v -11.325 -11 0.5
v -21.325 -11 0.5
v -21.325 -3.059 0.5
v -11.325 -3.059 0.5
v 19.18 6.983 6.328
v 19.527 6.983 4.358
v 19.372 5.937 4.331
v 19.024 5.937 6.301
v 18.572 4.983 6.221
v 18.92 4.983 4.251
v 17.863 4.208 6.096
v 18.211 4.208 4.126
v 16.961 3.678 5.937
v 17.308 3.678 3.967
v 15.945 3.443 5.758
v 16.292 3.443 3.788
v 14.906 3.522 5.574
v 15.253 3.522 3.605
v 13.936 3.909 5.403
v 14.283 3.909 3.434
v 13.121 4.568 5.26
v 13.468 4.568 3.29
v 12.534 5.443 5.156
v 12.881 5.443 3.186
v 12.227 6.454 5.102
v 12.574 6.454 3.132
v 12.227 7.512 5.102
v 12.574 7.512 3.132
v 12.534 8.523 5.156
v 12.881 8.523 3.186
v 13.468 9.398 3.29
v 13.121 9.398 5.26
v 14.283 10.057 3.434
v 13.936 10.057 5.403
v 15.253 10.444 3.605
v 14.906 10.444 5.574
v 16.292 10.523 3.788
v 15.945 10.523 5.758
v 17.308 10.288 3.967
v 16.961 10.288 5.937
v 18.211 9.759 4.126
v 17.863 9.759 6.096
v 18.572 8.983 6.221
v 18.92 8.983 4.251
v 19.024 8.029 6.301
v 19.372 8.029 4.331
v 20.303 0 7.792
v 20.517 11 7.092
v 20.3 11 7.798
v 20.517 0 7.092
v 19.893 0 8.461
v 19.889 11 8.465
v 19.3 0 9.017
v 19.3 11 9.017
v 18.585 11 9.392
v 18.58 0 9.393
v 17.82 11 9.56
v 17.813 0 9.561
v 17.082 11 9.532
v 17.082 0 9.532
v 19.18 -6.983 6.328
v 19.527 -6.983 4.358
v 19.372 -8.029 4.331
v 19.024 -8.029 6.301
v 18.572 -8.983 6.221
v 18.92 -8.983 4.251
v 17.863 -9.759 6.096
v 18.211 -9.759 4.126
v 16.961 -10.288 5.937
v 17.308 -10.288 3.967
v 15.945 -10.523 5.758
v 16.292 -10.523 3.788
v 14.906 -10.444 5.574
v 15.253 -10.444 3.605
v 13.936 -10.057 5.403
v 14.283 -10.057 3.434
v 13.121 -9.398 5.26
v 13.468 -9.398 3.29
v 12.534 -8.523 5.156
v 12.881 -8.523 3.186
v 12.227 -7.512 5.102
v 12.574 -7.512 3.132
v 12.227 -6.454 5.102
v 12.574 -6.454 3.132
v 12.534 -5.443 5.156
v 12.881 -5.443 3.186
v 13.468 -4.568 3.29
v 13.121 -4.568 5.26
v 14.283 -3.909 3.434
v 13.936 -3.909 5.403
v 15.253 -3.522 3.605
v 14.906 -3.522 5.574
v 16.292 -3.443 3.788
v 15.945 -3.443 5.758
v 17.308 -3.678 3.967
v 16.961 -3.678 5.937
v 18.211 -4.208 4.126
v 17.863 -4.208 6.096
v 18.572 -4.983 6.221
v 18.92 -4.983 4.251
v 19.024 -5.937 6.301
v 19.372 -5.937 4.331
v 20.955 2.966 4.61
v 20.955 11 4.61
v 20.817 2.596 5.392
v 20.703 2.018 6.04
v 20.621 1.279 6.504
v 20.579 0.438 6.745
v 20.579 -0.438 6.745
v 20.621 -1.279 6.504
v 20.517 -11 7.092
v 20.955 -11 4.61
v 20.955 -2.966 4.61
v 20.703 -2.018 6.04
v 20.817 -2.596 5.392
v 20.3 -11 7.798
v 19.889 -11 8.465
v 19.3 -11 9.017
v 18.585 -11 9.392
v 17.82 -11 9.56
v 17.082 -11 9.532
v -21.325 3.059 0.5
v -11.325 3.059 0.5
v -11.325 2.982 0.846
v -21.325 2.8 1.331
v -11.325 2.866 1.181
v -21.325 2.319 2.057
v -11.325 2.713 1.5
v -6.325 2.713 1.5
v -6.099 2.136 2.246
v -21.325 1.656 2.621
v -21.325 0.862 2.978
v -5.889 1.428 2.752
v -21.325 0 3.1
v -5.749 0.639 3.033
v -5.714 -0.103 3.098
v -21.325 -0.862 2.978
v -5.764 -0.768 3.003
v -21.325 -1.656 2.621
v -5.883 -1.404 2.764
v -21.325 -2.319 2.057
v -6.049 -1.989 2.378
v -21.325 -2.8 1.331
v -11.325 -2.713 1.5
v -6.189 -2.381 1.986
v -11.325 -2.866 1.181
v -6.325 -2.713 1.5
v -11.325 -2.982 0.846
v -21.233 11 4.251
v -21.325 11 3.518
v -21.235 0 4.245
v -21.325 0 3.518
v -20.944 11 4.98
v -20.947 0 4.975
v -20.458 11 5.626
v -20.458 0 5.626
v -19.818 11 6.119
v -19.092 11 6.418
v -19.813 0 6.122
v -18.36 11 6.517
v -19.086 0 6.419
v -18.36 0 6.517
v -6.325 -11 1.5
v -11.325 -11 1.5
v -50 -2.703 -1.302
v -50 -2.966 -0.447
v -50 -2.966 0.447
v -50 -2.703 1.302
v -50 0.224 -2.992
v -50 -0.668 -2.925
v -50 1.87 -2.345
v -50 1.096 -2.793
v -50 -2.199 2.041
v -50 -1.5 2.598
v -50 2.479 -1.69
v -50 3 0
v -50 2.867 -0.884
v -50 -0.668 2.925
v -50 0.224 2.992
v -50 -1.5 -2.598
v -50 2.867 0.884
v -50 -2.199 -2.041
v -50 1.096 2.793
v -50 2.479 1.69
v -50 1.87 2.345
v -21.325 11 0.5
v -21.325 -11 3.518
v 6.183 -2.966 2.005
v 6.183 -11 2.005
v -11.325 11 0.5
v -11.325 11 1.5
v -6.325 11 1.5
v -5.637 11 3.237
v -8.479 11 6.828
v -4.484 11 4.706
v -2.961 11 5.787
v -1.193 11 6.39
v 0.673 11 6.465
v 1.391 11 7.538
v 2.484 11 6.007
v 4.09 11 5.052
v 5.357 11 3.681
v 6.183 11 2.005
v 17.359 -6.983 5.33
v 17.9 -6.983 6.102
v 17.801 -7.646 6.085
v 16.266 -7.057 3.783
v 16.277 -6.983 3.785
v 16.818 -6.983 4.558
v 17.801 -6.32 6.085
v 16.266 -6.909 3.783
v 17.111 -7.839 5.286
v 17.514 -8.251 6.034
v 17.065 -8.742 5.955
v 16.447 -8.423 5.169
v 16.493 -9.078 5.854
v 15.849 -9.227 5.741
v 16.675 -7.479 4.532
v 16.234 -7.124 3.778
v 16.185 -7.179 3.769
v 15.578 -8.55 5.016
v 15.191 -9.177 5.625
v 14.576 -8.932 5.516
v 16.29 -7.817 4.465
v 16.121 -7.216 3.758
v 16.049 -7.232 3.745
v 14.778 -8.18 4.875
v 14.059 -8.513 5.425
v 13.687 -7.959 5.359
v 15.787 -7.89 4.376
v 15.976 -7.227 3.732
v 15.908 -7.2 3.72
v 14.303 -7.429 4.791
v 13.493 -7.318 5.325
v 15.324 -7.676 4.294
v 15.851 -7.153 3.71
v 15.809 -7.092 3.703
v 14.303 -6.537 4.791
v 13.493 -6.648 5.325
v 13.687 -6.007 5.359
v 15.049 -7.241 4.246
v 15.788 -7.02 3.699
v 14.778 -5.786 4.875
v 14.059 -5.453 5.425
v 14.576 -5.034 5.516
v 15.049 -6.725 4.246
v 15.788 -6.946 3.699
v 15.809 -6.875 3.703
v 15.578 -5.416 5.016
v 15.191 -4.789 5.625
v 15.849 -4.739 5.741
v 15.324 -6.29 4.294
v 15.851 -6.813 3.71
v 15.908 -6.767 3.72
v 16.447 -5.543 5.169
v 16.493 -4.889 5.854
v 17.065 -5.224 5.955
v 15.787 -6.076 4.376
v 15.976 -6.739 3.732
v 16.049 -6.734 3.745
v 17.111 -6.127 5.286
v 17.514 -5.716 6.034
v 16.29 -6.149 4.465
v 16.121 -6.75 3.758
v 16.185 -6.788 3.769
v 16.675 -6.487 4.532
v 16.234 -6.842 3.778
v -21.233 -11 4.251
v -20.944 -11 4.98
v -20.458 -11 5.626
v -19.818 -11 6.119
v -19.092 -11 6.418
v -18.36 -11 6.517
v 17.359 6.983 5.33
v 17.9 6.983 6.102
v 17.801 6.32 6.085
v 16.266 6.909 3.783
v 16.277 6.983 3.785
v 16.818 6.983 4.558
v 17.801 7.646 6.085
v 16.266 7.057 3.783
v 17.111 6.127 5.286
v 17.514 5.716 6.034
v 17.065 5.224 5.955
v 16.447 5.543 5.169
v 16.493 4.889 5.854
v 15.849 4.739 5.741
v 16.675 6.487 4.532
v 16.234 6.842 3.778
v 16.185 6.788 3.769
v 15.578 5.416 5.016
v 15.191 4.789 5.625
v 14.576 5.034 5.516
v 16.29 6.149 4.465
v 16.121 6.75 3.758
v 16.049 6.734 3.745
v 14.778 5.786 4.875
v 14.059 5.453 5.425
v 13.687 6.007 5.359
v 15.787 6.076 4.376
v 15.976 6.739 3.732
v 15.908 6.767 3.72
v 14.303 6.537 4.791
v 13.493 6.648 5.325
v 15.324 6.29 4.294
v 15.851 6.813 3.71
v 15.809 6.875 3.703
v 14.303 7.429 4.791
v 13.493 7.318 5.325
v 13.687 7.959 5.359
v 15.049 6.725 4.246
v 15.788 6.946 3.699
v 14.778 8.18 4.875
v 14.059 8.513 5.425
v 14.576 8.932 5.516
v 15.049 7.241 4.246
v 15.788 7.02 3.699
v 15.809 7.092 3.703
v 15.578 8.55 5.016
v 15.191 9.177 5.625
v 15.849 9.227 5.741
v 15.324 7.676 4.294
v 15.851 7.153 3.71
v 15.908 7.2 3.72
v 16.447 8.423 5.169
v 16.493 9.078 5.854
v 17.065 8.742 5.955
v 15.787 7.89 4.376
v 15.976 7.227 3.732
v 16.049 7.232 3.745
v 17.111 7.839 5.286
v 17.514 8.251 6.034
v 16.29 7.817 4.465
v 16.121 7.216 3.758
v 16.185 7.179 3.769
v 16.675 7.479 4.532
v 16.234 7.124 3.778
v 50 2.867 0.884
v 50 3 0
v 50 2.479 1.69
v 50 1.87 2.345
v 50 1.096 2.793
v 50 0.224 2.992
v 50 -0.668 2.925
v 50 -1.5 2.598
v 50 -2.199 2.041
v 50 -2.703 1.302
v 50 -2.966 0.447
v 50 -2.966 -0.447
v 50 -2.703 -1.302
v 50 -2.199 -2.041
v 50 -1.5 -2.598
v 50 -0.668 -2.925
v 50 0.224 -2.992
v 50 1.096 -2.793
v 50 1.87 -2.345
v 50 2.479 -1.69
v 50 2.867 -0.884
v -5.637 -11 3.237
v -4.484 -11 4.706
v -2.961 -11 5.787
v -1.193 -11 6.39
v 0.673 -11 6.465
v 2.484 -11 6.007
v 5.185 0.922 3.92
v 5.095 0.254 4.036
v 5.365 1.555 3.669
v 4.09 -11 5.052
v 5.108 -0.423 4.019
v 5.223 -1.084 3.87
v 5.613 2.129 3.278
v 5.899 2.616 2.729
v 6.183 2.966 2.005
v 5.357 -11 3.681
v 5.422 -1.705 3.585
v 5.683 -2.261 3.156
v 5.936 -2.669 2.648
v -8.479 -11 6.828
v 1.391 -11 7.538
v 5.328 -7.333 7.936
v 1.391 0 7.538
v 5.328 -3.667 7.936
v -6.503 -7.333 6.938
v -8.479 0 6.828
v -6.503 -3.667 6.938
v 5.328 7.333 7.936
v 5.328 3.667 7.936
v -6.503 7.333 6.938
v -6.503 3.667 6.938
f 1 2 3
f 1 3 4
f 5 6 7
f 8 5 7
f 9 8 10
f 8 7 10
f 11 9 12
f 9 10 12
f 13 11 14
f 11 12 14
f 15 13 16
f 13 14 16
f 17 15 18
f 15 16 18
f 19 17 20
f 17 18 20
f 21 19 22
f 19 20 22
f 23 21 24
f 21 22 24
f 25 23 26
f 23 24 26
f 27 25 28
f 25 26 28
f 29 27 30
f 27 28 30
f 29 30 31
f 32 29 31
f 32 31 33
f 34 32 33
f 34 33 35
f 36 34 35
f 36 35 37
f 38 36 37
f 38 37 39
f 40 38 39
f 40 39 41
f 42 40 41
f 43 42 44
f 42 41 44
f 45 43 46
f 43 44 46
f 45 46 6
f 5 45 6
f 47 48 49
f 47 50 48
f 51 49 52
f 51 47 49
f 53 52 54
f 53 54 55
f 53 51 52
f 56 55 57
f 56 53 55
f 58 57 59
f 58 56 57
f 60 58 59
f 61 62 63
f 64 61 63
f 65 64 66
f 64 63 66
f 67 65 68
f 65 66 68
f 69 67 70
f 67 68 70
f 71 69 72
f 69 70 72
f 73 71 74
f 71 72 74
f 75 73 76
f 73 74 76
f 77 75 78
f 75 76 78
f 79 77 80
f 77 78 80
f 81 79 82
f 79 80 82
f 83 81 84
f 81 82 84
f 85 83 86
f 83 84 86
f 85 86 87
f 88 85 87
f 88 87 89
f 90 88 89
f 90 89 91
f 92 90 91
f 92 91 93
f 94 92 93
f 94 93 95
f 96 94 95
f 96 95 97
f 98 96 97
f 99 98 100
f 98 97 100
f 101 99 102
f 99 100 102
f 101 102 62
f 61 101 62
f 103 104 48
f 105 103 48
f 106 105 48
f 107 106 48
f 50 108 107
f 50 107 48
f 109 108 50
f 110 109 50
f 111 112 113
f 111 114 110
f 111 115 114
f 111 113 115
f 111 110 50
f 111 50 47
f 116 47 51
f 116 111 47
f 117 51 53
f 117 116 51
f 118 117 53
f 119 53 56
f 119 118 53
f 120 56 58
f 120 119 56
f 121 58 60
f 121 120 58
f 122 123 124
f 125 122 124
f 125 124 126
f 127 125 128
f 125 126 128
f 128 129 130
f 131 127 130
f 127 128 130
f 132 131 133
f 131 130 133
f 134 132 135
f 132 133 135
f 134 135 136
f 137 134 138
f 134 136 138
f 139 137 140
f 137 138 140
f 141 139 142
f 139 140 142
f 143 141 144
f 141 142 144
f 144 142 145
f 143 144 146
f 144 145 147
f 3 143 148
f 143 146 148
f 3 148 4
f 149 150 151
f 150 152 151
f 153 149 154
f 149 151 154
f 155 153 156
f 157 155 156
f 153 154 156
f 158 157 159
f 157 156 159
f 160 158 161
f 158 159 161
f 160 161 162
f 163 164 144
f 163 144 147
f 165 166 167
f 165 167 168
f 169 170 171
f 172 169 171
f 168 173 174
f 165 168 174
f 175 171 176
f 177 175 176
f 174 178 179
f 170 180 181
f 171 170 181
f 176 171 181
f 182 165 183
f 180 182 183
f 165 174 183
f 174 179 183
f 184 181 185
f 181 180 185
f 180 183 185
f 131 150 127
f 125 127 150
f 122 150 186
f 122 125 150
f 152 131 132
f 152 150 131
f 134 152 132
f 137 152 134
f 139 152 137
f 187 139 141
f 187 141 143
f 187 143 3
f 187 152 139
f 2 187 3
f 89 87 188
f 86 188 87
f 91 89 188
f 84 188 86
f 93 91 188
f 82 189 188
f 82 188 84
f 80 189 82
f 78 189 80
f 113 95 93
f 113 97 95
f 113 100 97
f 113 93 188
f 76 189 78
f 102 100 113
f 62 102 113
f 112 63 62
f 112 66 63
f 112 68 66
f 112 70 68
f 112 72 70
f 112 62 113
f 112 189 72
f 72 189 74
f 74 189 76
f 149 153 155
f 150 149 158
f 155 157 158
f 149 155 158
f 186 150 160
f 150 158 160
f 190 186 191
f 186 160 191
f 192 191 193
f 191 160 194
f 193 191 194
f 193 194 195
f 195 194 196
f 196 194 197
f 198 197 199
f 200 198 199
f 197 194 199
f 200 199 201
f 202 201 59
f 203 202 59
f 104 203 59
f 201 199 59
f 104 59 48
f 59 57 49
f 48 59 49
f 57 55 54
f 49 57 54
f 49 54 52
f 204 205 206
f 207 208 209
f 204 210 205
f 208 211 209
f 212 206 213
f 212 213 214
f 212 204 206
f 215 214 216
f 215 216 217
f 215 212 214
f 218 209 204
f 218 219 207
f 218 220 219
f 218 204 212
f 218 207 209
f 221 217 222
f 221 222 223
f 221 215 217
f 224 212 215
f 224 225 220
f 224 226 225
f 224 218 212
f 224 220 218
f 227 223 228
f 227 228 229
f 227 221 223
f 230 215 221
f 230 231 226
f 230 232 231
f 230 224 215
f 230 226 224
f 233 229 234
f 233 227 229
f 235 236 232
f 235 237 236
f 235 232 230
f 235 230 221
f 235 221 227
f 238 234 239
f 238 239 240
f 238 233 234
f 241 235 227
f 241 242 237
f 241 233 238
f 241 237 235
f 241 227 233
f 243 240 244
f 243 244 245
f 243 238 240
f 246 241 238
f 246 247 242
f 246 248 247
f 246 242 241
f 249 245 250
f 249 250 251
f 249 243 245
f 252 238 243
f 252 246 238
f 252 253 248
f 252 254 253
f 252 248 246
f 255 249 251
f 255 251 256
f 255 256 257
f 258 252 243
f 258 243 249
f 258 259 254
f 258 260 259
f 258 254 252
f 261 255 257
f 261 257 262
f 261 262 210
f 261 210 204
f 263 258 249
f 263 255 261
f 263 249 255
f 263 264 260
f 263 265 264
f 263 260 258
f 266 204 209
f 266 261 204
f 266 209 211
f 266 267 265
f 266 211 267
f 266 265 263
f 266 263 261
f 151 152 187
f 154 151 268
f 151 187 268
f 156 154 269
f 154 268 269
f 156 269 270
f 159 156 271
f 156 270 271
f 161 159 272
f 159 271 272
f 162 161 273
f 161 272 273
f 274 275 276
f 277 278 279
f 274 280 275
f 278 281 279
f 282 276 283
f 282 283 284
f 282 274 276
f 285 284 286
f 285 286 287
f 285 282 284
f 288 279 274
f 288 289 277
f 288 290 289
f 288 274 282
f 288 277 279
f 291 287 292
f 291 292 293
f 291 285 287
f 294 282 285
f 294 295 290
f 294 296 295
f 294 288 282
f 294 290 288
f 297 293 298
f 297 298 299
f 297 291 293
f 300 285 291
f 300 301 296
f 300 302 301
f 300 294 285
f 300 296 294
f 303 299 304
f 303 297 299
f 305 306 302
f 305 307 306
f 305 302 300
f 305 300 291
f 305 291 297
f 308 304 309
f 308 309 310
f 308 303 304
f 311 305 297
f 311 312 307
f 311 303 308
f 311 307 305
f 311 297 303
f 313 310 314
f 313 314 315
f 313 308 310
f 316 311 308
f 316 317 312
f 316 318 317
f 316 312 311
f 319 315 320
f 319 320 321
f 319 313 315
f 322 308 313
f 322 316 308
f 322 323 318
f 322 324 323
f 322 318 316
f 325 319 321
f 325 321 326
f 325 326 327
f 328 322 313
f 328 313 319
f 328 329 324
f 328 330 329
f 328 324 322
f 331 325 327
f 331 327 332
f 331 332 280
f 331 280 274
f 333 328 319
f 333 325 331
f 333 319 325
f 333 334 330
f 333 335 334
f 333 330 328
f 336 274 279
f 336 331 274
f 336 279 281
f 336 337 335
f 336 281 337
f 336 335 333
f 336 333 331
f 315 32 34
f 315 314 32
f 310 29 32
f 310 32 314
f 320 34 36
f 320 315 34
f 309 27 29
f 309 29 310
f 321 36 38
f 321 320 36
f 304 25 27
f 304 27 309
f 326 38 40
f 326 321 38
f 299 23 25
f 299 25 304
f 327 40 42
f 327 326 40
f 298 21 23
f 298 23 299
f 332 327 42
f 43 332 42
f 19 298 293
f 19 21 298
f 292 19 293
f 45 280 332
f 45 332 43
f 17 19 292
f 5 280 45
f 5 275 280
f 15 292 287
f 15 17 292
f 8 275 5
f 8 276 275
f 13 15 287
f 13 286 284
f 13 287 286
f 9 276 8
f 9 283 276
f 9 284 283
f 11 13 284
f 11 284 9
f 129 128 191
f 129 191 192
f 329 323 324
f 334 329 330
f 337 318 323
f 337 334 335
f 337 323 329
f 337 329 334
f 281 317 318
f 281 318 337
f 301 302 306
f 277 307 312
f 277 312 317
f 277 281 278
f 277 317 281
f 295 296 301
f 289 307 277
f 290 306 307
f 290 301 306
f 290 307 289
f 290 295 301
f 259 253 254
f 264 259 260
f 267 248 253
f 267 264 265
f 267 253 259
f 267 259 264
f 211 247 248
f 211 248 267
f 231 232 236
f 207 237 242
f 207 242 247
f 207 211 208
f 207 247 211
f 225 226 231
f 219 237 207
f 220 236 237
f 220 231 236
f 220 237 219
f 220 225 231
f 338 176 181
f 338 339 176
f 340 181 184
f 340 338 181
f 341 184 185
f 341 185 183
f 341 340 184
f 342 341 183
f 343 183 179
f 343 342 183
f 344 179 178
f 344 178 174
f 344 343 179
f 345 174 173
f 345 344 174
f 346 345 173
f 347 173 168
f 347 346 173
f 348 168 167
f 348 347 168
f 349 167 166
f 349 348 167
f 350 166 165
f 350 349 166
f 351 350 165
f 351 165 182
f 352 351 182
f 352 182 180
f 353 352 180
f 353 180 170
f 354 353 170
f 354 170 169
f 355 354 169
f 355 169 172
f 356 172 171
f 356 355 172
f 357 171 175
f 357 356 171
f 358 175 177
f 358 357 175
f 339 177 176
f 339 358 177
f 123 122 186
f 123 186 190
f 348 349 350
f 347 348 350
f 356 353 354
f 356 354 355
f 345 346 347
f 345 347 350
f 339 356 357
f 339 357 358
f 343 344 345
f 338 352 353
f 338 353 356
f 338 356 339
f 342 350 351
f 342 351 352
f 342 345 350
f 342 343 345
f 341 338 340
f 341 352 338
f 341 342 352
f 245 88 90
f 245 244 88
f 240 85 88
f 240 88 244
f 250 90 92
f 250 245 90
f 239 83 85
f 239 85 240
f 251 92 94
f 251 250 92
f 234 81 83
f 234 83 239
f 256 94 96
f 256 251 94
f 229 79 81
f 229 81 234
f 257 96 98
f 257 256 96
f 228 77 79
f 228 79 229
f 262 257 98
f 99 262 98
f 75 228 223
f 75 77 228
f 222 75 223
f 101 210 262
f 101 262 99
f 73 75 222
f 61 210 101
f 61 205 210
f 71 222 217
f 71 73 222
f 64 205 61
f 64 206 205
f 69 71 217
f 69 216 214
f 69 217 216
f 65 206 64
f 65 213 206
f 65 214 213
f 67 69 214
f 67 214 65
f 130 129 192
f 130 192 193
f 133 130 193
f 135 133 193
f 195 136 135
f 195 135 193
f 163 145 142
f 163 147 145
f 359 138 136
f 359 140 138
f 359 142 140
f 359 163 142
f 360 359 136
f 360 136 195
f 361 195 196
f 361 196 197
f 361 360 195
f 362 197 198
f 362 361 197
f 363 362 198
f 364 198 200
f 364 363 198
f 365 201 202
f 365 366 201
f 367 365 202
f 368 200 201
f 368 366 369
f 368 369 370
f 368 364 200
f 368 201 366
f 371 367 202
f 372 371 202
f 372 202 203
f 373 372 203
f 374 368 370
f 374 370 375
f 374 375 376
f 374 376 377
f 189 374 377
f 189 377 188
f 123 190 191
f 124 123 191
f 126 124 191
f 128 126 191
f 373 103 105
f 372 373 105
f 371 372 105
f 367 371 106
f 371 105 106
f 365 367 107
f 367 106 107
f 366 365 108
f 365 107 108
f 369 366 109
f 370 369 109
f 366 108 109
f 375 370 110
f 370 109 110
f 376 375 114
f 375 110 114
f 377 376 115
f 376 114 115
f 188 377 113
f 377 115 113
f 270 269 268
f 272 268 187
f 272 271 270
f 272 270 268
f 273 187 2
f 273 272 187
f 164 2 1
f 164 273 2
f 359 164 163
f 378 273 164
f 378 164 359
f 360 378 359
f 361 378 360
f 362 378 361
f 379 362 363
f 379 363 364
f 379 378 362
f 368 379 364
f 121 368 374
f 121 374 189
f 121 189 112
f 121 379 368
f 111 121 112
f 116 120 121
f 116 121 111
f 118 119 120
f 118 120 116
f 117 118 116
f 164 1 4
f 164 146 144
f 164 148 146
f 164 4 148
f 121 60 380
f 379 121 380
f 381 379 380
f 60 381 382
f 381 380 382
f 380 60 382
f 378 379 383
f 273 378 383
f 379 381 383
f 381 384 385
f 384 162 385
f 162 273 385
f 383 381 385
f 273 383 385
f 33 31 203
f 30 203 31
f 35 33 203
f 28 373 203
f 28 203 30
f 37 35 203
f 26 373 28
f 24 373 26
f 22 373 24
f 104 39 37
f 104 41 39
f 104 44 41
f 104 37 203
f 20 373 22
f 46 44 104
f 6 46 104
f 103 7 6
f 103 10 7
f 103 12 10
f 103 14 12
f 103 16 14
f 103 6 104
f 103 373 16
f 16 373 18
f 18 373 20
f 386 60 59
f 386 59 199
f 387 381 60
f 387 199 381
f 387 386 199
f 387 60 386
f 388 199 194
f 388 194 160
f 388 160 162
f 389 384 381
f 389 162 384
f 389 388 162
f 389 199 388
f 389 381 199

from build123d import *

# Parameters (mm, degrees)
F1_DEPTH = 11
F2_R     = 3.1
F3_DEPTH = 30
F5_DEPTH = 60
F6_R     = 3
F7_DEPTH = 50
F8_R     = 3.55
F8_R_2   = 2.25
F9_DEPTH = 2
F11_R    = 3


# Not quite as in the source:
# - a fillet or chamfer that OpenCascade refuses, or shapes differently, is made with other operations: its cross-section is extruded or revolved along the edge and cut away or added


with BuildPart() as f1:
    # F0 (on Front) → F1 (new body, symmetric)
    with BuildSketch(Plane.XZ):
        with BuildLine():
            Line((-11.3245553203, 1.5), (-6.3245553203, 1.5))
            ThreePointArc((-6.3245553203, 1.5), (-4.0311288741, 5.0990195136), (0, 6.5))
            Line((0, 6.5), (-21.3245553203, 6.5))
            Line((-21.3245553203, 6.5), (-21.3245553203, 0.5))
            Line((-21.3245553203, 0.5), (-11.3245553203, 0.5))
            Line((-11.3245553203, 0.5), (-11.3245553203, 1.5))
        make_face()
        with BuildLine():
            ThreePointArc((0, 6.5), (3.8219824935, 5.2576087549), (6.182919575, 2.0053691753))
            Line((6.182919575, 2.0053691753), (20.9550358702, 4.6100918403))
            Line((20.9550358702, 4.6100918403), (19.999970893, 10.0265344818))
            Line((19.999970893, 10.0265344818), (0, 6.5))
        make_face()
        with BuildLine():
            Line((-21.3245553203, 6.5), (0, 6.5))
            Line((0, 6.5), (19.999970893, 10.0265344818))
            add(Edge.make_bspline(
                [(19.999970893, 10.0265344818), (6.3930427733, 7.6272659298), (-7.5069618116, 6.5), (-21.3245553203, 6.5)],
                knots=[0, 0, 0, 0, 41.4747261861, 41.4747261861, 41.4747261861, 41.4747261861], degree=3))
        make_face()
    extrude(amount=F1_DEPTH, both=True)

    # F2 (on Right) → F3 (cut, symmetric)
    with BuildSketch(Plane.YZ):
        Circle(F2_R)
    extrude(amount=F3_DEPTH, both=True, mode=Mode.SUBTRACT)

    # F4 (on face) → F5 (cut)
    with BuildSketch(Plane(origin=(21.1115363588, 0, 3.7225334643), x_dir=(0, 1, 0), z_dir=(0.984807753, 0, 0.1736481777))):
        with BuildLine():
            Line((-2.9660997499, 0.9012503946), (2.9660997499, 0.9012503946))
            ThreePointArc((2.9660997499, 0.9012503946), (0, 3.1), (-2.9660997499, 0.9012503946))
        make_face()
        with BuildLine():
            ThreePointArc((-2.9660997499, 0.9012503946), (-0.4555714957, -3.0663422204), (3.1, 0))
            ThreePointArc((3.1, 0), (3.0663422204, 0.4555714957), (2.9660997499, 0.9012503946))
            Line((2.9660997499, 0.9012503946), (-2.9660997499, 0.9012503946))
        make_face()
    extrude(amount=-F5_DEPTH, mode=Mode.SUBTRACT)

    # F8 (on face) → F9 (cut)
    with BuildSketch(Plane(origin=(-0.1565004886, 0, 0.887558376), x_dir=(0.984807753, 0, 0.1736481777), z_dir=(0.1736481777, 0, -0.984807753))):
        with Locations((16.4372158365, 6.9830498749)):
            Circle(F8_R)
        with Locations((16.4372158365, 6.9830498749)):
            Circle(F8_R_2, mode=Mode.SUBTRACT)
        with Locations((16.4372158365, -6.9830498749)):
            Circle(F8_R)
        with Locations((16.4372158365, -6.9830498749)):
            Circle(F8_R_2, mode=Mode.SUBTRACT)
    extrude(amount=-F9_DEPTH, mode=Mode.SUBTRACT)

    # F10: chamfer of 2 on 2 edges, made by hand


with BuildPart() as f7:
    # F6 (on Right) → F7 (new body, symmetric)
    with BuildSketch(Plane.YZ):
        Circle(F6_R)
    extrude(amount=F7_DEPTH, both=True)


with BuildPart() as f10_tool2:
    # F10_s3 → F10_t4 (revolve)
    with BuildSketch(Plane.XZ.offset(6.9830498749)):
        Polygon((17.8995181941, 6.1021748577), (16.2771990434, 3.7852629963), (18.2468145494, 4.1325593517), align=None)
    revolve(axis=Axis((16.0309971051, -6.9830498749, 3.7418509519), (0.1736481777, 0, -0.984807753)))

    split(bisect_by=Plane(origin=(-0.503796844, 0, 2.857173882), x_dir=(0, 1, 0), z_dir=(0.1736481777, 0, -0.984807753)), keep=Keep.TOP)


with BuildPart() as f1_1:
    add(f1.part)

    # F10_t1: cut F10_tool2
    add(f10_tool2.part, mode=Mode.SUBTRACT)


with BuildPart() as f10_tool7:
    # F10_s8 → F10_t9 (revolve)
    with BuildSketch(Plane.XZ.offset(-6.9830498749)):
        Polygon((17.8995181941, 6.1021748577), (16.2771990434, 3.7852629963), (18.2468145494, 4.1325593517), align=None)
    revolve(axis=Axis((16.0309971051, 6.9830498749, 3.7418509519), (0.1736481777, 0, -0.984807753)))

    split(bisect_by=Plane(origin=(-0.503796844, 0, 2.857173882), x_dir=(0, 1, 0), z_dir=(0.1736481777, 0, -0.984807753)), keep=Keep.TOP)


with BuildPart() as f1_2:
    add(f1_1.part)

    # F10_t6: cut F10_tool7
    add(f10_tool7.part, mode=Mode.SUBTRACT)

    # F11
    f11_edges = [f1_2.edges().sort_by_distance(p)[0] for p in [
        (19.999971, -5.5, 10.026534),
        (19.999971, 5.5, 10.026534),
        (-21.324555, -5.5, 6.5),
        (-21.324555, 5.5, 6.5),
    ]]
    fillet(f11_edges, radius=F11_R)


solid = Compound([f7.part, f1_2.part])
